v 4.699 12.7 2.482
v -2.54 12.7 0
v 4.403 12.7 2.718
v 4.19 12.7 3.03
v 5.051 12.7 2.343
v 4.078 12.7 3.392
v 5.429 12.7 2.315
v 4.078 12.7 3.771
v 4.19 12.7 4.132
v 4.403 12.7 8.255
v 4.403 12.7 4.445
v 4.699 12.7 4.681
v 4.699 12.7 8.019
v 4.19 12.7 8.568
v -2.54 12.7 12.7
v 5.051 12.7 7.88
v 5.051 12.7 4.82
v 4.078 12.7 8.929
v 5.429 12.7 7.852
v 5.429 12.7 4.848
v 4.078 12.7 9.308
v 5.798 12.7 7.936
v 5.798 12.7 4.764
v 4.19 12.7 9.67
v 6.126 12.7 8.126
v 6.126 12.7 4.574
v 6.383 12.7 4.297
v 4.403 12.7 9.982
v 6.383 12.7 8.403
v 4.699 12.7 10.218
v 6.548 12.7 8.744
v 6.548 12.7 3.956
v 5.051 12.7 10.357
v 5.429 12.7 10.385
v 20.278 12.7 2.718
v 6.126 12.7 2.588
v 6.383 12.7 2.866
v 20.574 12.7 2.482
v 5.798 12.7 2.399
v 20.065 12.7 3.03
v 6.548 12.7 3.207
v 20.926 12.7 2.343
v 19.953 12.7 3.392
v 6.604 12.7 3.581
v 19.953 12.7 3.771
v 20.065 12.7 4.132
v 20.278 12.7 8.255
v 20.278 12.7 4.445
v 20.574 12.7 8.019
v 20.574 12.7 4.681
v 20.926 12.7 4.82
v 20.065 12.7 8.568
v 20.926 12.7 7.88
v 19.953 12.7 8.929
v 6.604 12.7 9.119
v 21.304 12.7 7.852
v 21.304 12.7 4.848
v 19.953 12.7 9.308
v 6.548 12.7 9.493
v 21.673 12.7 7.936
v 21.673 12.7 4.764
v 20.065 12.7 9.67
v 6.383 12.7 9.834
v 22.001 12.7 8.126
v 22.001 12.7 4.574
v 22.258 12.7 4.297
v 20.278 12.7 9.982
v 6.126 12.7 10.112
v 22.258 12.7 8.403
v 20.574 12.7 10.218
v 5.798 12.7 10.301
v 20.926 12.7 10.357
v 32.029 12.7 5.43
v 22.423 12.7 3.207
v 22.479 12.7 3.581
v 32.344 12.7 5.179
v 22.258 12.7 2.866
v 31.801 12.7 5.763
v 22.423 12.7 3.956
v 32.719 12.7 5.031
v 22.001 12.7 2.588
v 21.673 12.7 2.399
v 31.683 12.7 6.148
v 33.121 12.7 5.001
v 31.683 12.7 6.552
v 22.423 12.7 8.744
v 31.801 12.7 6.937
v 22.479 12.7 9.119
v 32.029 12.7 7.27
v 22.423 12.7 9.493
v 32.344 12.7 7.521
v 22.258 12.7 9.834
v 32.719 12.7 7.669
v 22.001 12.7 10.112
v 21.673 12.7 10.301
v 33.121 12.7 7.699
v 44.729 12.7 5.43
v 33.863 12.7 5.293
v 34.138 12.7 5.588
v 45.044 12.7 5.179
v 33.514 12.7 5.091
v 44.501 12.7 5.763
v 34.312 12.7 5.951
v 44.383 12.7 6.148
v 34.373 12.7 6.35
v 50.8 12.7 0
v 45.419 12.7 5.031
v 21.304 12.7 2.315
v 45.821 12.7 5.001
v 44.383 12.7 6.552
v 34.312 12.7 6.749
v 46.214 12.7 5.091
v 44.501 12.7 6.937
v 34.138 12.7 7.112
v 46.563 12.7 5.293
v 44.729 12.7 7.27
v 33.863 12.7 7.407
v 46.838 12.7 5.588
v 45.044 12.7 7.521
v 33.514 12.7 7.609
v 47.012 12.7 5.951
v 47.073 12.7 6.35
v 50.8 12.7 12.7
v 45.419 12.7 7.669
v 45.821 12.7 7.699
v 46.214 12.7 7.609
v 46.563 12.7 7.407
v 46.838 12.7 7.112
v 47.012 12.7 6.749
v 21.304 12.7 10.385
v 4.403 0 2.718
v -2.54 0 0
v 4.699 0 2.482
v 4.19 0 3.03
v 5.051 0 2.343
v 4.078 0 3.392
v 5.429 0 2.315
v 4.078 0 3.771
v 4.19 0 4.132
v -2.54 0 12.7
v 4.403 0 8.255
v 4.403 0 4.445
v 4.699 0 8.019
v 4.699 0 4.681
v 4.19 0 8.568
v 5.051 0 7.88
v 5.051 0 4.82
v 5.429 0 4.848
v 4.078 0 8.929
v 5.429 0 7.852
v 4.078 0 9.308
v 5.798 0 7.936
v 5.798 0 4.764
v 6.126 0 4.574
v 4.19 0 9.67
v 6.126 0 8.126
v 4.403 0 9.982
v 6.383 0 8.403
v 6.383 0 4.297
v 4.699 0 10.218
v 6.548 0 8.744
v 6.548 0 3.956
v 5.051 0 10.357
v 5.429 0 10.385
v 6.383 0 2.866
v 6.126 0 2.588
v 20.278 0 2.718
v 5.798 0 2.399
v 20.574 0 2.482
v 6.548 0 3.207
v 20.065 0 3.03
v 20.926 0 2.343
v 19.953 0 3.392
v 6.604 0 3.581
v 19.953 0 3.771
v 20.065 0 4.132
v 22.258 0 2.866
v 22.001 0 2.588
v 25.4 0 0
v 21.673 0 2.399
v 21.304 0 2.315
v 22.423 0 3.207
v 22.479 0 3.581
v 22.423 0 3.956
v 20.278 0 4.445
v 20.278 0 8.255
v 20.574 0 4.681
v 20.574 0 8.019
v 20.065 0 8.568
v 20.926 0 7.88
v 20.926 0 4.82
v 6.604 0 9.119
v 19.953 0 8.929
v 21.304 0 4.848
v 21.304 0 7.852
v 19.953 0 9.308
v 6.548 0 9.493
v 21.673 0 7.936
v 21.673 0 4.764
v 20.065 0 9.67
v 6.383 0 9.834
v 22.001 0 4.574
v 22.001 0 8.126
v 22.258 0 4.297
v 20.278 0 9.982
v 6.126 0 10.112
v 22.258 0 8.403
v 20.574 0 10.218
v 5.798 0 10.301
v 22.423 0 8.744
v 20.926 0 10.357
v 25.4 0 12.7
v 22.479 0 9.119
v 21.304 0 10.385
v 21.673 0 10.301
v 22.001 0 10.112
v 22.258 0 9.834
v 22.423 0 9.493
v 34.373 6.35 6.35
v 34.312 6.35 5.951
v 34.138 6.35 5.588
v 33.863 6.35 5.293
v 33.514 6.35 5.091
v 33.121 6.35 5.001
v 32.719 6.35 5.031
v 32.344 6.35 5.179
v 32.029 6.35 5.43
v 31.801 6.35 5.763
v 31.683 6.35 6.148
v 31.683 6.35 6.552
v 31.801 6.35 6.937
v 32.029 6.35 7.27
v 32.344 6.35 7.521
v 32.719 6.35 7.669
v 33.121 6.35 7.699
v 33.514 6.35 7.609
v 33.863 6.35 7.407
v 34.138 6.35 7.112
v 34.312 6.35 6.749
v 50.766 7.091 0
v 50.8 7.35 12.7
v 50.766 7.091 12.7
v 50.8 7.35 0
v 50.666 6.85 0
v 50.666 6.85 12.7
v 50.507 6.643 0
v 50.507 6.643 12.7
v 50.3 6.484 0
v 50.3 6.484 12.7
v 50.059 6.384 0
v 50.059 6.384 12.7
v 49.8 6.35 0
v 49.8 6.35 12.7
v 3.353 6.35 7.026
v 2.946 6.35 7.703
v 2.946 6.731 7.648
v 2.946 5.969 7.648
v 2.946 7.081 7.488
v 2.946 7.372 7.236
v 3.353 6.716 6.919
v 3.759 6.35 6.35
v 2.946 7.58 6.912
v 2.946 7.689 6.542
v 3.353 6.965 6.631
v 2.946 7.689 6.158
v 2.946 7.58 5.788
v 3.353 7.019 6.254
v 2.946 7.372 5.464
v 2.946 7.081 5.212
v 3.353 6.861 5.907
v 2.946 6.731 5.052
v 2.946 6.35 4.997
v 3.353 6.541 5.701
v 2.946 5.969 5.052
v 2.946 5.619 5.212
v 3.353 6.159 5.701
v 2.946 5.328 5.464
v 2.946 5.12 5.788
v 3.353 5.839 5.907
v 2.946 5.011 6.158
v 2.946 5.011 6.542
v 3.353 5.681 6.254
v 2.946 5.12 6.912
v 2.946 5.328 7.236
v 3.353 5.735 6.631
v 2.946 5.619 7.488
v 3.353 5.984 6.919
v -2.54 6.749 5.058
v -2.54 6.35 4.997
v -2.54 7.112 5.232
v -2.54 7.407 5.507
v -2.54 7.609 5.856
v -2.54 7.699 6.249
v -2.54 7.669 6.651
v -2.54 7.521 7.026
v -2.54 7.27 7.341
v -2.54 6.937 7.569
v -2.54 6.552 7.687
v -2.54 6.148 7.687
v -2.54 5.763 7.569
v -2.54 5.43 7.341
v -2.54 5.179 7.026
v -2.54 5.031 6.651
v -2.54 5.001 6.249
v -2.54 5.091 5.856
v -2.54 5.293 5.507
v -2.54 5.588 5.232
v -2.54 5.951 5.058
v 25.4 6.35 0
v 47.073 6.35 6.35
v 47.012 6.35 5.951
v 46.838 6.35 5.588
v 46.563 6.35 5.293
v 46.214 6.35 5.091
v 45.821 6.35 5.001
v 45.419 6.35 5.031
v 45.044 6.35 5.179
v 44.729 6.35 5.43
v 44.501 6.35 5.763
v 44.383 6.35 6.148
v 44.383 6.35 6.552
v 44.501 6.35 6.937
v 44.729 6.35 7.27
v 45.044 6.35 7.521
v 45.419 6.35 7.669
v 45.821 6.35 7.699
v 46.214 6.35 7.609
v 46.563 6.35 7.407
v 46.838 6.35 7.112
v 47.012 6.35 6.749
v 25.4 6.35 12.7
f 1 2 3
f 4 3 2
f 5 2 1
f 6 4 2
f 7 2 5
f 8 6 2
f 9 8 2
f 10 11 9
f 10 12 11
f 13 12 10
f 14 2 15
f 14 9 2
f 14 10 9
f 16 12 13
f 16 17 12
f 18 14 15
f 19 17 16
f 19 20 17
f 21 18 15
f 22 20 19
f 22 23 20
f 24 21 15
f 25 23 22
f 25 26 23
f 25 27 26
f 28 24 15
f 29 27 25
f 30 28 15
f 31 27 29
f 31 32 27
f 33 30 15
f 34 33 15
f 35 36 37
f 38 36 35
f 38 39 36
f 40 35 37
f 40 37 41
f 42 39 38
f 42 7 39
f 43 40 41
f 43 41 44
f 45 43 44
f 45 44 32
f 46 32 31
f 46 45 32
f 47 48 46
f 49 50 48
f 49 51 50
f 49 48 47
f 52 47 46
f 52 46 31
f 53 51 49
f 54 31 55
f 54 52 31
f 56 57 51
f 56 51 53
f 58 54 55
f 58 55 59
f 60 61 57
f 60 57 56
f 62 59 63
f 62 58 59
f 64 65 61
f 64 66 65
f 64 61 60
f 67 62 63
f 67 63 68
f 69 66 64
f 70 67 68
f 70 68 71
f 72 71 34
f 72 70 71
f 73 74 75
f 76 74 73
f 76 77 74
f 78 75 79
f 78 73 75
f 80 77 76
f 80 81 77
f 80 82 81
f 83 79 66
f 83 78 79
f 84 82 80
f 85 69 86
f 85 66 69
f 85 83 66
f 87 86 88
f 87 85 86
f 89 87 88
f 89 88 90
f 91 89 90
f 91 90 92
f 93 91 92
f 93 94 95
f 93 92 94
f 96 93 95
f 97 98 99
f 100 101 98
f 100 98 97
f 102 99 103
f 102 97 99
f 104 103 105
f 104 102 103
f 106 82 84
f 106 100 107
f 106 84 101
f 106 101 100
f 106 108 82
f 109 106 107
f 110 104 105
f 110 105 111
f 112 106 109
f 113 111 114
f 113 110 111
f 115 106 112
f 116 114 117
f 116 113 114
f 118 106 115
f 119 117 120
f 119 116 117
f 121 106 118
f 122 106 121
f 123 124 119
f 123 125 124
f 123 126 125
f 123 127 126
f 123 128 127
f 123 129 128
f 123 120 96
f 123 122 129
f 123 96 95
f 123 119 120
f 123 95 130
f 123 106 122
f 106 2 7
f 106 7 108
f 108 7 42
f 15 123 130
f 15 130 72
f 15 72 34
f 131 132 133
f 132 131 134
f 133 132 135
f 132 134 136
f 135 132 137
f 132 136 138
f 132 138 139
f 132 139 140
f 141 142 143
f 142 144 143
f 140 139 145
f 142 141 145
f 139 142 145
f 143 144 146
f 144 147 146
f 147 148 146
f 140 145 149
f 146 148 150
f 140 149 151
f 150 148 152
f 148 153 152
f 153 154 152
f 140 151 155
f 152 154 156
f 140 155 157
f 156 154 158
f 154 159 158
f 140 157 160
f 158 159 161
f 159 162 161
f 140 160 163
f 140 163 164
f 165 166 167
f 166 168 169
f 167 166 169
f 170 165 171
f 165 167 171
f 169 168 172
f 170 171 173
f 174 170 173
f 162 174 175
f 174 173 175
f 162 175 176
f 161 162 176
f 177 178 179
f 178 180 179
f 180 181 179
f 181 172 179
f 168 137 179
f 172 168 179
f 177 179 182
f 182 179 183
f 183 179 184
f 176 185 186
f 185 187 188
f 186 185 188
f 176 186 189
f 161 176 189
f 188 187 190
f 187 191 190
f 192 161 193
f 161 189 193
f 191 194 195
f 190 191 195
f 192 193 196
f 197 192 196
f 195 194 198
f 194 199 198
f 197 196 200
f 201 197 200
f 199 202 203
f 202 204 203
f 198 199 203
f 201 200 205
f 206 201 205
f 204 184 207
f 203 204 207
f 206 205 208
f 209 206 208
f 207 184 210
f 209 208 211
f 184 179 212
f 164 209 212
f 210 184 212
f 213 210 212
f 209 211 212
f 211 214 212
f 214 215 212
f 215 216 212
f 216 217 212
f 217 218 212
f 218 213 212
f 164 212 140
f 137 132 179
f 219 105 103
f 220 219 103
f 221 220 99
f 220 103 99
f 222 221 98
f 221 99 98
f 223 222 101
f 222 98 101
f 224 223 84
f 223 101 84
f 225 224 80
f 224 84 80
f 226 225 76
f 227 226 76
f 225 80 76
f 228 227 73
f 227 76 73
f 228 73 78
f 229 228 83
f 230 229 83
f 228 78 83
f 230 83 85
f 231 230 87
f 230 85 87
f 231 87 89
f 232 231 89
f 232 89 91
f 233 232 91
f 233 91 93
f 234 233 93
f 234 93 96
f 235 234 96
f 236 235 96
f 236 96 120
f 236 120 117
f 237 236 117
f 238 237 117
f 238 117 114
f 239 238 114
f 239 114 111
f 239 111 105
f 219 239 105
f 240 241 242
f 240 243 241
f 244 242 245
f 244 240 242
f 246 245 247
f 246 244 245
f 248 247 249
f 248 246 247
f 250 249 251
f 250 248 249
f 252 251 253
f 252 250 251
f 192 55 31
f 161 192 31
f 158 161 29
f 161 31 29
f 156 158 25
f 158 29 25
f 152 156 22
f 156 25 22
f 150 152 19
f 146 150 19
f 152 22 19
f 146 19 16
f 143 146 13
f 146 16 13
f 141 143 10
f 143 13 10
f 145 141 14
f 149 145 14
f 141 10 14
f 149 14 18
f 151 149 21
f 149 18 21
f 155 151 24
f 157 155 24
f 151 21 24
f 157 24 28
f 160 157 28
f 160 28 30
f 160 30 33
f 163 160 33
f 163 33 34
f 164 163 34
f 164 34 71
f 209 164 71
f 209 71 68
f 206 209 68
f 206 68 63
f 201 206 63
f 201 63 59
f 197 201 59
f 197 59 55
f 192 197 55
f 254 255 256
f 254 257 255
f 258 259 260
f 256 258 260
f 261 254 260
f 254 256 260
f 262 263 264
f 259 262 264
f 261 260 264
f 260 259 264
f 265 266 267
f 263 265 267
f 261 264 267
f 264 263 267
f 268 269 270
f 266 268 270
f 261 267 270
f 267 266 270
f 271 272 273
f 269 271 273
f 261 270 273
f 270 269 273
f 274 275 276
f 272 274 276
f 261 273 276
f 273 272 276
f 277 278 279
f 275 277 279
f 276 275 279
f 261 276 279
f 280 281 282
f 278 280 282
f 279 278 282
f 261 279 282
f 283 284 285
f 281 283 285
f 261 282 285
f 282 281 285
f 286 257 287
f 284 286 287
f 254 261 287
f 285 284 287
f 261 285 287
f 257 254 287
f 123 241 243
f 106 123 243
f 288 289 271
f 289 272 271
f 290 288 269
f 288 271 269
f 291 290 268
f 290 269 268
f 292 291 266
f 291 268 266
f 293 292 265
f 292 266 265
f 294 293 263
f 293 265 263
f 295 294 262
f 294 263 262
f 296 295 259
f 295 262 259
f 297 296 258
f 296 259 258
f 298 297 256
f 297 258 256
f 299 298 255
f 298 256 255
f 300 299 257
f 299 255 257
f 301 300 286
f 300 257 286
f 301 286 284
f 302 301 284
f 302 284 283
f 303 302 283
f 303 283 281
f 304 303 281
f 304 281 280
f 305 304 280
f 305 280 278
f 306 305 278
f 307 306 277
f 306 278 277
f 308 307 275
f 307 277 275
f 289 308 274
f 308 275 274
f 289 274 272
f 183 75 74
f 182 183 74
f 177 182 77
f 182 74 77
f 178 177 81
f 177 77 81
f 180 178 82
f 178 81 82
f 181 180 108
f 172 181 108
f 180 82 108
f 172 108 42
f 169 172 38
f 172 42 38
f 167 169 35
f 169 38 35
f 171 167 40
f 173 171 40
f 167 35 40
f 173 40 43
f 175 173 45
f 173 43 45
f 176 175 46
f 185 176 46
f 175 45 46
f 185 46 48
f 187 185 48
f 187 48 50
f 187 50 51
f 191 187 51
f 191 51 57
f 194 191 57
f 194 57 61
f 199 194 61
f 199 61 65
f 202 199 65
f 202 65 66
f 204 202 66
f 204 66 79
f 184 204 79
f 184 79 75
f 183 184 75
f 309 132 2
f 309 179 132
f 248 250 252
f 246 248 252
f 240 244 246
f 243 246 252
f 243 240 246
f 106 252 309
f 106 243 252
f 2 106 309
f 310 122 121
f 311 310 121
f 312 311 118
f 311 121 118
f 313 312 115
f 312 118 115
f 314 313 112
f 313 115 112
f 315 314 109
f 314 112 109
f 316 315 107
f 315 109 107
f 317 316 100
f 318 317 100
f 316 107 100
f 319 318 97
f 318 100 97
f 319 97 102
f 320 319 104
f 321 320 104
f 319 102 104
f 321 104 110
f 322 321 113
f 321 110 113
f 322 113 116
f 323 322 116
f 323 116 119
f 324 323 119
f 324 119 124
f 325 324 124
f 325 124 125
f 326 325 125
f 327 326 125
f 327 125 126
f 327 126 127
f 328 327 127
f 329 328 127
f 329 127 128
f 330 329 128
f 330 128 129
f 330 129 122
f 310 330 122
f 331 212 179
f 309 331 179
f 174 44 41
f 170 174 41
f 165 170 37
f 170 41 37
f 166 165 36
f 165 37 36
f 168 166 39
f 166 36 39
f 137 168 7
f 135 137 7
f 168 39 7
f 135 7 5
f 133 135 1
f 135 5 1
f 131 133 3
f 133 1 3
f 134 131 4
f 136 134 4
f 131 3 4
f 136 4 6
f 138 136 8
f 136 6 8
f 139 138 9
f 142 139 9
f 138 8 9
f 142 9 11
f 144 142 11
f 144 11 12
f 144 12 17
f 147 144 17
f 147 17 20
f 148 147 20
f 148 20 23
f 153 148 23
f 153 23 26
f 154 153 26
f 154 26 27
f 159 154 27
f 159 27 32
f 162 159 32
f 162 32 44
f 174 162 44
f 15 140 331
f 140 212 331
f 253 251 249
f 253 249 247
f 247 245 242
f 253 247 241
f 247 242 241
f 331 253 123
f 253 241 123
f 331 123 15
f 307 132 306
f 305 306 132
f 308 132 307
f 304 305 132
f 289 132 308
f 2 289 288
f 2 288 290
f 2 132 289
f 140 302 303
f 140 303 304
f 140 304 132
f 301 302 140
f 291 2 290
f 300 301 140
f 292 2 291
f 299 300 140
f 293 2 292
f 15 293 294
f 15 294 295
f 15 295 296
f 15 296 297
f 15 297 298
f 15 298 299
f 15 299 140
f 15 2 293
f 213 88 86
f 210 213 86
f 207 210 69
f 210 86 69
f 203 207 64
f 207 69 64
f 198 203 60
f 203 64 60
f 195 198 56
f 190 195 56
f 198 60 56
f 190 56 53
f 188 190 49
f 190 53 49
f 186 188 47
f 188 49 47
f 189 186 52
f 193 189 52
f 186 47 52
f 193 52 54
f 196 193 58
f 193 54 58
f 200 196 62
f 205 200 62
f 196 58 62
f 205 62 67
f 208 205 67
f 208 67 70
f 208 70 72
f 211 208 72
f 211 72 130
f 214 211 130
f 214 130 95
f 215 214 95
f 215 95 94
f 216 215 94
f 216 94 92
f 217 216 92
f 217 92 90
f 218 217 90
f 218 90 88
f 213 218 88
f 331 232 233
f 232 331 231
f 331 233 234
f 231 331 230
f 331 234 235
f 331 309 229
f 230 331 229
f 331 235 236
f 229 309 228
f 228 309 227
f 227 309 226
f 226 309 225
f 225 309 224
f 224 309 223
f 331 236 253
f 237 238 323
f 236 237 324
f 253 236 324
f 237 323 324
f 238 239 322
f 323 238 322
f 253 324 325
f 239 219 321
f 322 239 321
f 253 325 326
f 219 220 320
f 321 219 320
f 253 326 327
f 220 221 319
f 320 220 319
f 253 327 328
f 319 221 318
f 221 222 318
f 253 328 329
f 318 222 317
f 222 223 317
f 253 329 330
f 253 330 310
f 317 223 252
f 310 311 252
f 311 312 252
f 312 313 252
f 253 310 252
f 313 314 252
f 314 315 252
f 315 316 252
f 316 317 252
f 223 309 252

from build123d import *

# Parameters (mm, degrees)
SKETCH2_W                  = 25.4
SKETCH2_H                  = 12.7
BOSS_EXTRUDE1_DEPTH        = 6.35
SKETCH3_R                  = 0.5461
CUT_EXTRUDE1_DEPTH         = 7.35
SKETCH4_W                  = 50.8
SKETCH4_H                  = 12.7
BOSS_EXTRUDE2_DEPTH        = 6.35
F_8_0_199_DIAMETER_HOLE1_D = 2.54
F_6_32_TAPPED_HOLE3_D      = 2.7051
FILLET1_R                  = 1
SKETCH17_W                 = 12.7
SKETCH17_H                 = 12.7
BOSS_EXTRUDE3_DEPTH        = 2.54
F_6_32_TAPPED_HOLE4_D      = 2.7051
F_6_32_TAPPED_HOLE4_DEPTH  = 5.4864
F_6_32_TAPPED_HOLE4_TIP    = 0.81269403


with BuildPart() as part:
    # Sketch2 → Boss-Extrude1 (new body)
    with BuildSketch(Plane(origin=(0, 0, 0), x_dir=(1, 0, 0), z_dir=(0, 1, 0))):
        with Locations((12.7, -6.35)):
            Rectangle(SKETCH2_W, SKETCH2_H)
    extrude(amount=BOSS_EXTRUDE1_DEPTH)

    # Sketch3 → Cut-Extrude1 (cut, through all)
    with BuildSketch(Plane.XZ):
        with Locations((5.334, 9.1186)):
            Circle(SKETCH3_R)
        with Locations((5.334, 3.5814)):
            Circle(SKETCH3_R)
        with Locations((21.209, 3.5814)):
            Circle(SKETCH3_R)
        with Locations((21.209, 9.1186)):
            Circle(SKETCH3_R)
    extrude(amount=-CUT_EXTRUDE1_DEPTH, mode=Mode.SUBTRACT)

    # Sketch4 → Boss-Extrude2 (add)
    with BuildSketch(Plane(origin=(0, 6.35, 0), x_dir=(1, 0, 0), z_dir=(0, 1, 0))):
        with Locations((25.4, -6.35)):
            Rectangle(SKETCH4_W, SKETCH4_H)
    extrude(amount=BOSS_EXTRUDE2_DEPTH)

    # #8 (0.199) Diameter Hole1 (through all)
    with Locations(Plane(origin=(0, 0, 0), x_dir=(-1, 0, 0), z_dir=(0, -1, 0))):
        with Locations((-5.334, -3.5814), (-21.209, -3.5814), (-21.209, -9.1186), (-5.334, -9.1186)):
            Hole(F_8_0_199_DIAMETER_HOLE1_D / 2)

    # #6-32 Tapped Hole3 (through all)
    with Locations(Plane(origin=(0, 6.35, 0), x_dir=(-1, 0, 0), z_dir=(0, -1, 0))):
        with Locations((-33.02, -6.35), (-45.72, -6.35)):
            Hole(F_6_32_TAPPED_HOLE3_D / 2)

    # Fillet1
    fillet1_edges = [part.edges().sort_by_distance(p)[0] for p in [
        (50.8, 6.35, 6.35),
    ]]
    fillet(fillet1_edges, radius=FILLET1_R)

    # Sketch17 → Boss-Extrude3 (add)
    with BuildSketch(Plane.ZY):
        with Locations((6.35, 6.35)):
            Rectangle(SKETCH17_W, SKETCH17_H)
    extrude(amount=BOSS_EXTRUDE3_DEPTH)

    # #6-32 Tapped Hole4
    with Locations(Plane.ZY.offset(2.54)):
        with Locations((6.35, 6.35)):
            Hole(F_6_32_TAPPED_HOLE4_D / 2, depth=F_6_32_TAPPED_HOLE4_DEPTH)
            with Locations((0, 0, -(F_6_32_TAPPED_HOLE4_DEPTH + F_6_32_TAPPED_HOLE4_TIP / 2))):  # 118° drill point
                Cone(0, F_6_32_TAPPED_HOLE4_D / 2, F_6_32_TAPPED_HOLE4_TIP, mode=Mode.SUBTRACT)


solid = part.part
